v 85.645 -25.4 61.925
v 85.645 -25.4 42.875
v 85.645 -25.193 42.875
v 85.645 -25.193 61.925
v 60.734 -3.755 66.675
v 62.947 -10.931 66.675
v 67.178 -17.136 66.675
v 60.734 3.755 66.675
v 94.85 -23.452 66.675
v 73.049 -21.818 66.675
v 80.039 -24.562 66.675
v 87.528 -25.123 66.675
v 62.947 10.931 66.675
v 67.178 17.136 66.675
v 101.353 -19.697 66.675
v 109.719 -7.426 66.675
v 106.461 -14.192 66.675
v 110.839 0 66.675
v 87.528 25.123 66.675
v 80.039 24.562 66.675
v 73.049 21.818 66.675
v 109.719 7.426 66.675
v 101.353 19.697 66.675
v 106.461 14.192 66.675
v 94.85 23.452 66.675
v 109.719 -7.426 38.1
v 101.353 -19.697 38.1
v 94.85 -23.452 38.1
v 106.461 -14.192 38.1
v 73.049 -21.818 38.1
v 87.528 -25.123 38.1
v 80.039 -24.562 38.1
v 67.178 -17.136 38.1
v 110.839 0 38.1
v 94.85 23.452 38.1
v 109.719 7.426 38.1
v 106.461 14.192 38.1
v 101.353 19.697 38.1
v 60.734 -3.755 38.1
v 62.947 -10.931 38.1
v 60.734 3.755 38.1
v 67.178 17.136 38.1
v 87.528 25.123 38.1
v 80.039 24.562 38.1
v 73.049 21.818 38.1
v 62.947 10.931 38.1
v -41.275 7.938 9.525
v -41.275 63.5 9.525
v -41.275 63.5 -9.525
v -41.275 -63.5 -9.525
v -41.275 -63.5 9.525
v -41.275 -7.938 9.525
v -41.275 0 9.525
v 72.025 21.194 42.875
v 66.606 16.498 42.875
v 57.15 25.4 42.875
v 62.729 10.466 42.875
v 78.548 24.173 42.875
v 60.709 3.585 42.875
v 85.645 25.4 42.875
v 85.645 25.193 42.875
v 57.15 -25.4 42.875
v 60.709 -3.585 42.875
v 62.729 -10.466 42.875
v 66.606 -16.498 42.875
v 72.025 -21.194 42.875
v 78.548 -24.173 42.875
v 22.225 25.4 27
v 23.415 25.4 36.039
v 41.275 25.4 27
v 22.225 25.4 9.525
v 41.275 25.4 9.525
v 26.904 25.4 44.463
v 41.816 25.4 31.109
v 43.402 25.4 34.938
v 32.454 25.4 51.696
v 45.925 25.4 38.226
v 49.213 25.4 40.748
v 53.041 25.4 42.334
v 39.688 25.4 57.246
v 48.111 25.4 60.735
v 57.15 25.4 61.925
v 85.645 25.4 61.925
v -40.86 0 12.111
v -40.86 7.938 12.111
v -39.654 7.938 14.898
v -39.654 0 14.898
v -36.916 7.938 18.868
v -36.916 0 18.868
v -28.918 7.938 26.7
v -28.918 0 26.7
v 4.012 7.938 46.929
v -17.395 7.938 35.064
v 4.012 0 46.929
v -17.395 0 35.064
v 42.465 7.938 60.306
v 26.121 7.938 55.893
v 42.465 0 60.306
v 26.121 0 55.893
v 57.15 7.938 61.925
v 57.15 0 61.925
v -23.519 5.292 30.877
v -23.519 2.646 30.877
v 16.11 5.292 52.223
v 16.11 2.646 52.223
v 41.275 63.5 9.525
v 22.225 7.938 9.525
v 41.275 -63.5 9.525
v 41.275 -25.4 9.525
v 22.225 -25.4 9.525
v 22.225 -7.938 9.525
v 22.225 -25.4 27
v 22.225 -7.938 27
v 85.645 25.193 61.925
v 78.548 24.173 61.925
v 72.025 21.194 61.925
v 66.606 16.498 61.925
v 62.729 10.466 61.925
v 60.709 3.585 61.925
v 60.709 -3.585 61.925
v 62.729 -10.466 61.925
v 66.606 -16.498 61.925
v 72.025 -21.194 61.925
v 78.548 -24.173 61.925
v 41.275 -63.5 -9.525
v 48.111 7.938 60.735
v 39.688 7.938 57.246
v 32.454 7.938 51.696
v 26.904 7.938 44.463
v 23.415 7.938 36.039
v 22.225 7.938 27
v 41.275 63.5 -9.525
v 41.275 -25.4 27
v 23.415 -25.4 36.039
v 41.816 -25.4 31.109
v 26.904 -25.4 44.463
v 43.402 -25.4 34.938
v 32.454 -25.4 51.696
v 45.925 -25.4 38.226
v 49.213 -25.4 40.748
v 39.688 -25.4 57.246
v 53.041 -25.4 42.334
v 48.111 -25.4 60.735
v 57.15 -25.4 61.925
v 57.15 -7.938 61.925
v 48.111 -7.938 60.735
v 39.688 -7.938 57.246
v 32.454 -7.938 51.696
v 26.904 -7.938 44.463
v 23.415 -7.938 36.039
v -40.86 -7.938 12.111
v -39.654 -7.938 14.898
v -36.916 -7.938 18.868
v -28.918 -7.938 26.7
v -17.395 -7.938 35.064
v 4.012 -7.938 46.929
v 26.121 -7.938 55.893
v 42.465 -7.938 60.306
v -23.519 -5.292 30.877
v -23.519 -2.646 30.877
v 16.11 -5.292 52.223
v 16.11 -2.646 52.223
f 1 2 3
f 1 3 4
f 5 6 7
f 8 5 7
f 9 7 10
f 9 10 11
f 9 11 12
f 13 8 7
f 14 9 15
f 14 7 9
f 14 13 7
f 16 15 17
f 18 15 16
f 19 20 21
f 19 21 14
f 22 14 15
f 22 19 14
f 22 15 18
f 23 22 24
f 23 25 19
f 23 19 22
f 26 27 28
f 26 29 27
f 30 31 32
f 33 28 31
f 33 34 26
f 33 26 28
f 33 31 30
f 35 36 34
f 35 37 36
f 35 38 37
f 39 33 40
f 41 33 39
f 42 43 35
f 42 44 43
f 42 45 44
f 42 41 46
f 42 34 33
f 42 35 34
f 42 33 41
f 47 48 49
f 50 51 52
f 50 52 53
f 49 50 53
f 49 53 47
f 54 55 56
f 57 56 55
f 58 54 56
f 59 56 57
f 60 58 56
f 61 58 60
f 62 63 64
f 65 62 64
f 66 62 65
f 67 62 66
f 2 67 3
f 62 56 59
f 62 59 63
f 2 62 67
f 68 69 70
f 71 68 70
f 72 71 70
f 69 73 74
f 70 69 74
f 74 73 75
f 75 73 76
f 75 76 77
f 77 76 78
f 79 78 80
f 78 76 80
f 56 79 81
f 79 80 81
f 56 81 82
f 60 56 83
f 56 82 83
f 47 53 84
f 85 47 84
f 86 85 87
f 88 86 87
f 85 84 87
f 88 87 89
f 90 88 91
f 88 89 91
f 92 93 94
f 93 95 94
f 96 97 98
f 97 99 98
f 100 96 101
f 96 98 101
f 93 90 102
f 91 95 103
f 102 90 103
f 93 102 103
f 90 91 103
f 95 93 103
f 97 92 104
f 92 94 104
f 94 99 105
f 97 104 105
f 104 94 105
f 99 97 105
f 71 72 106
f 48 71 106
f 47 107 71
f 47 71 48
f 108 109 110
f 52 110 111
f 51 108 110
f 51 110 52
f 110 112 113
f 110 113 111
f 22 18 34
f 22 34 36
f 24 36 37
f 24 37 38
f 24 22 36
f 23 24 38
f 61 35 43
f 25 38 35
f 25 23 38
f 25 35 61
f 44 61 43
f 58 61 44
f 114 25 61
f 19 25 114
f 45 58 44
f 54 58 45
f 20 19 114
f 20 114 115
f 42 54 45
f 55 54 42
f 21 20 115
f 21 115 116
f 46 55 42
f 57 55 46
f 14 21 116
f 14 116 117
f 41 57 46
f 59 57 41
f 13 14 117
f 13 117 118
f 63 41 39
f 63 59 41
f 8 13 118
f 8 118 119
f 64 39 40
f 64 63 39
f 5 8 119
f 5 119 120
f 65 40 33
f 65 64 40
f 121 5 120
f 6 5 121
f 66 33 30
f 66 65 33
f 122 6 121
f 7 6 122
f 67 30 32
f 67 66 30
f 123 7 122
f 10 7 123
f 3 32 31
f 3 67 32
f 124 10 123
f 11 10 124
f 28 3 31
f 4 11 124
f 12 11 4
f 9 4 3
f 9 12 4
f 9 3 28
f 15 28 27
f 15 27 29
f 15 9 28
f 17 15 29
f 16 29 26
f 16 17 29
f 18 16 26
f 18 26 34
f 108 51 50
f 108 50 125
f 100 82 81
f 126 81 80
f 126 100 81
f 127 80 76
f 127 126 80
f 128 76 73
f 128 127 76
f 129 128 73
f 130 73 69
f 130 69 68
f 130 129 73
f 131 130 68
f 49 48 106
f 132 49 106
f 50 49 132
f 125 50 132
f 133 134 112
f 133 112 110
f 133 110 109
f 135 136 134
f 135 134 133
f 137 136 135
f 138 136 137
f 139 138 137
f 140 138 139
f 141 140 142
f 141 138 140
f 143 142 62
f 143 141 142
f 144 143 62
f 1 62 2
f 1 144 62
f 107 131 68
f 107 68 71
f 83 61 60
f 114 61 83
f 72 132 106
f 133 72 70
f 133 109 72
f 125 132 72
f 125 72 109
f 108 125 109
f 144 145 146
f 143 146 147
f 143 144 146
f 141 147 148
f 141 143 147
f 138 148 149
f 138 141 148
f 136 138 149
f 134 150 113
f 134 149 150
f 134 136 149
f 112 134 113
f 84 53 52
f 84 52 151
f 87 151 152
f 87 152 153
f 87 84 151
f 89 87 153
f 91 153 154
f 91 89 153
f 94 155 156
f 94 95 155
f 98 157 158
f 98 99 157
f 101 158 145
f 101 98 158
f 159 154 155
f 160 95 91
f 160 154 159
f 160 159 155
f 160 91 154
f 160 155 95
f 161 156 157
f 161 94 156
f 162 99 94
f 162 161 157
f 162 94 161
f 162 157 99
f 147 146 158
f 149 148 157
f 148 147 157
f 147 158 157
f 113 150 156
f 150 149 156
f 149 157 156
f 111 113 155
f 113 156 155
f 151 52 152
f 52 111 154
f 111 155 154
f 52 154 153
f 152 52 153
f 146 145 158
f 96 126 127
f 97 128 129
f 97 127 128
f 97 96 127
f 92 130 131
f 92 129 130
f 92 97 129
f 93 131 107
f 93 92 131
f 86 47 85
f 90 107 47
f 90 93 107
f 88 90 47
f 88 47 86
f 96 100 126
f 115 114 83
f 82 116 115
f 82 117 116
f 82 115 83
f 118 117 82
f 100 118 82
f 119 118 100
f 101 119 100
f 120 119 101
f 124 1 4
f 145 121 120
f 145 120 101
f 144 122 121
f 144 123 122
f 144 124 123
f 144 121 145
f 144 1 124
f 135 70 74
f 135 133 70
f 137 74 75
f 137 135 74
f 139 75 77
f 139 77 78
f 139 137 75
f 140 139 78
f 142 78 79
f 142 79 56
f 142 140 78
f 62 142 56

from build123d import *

# Parameters (mm, degrees)
F1_DEPTH = 63.5
F0_W     = 25.6068090757
F0_H     = 19.05
F2_DEPTH = 25.4
F3_DEPTH = 7.9375


with BuildPart() as f1:
    # F0 (on Front) → F1 (new body, symmetric)
    with BuildSketch(Plane.XZ):
        Polygon((-41.275, 9.525), (-41.275, -9.525), (41.275, -9.525), (41.275, 9.525), (22.225, 9.525), align=None)
    extrude(amount=F1_DEPTH, both=True)

    # F0 (on Front) → F2 (join, symmetric)
    with BuildSketch(Plane.XZ):
        with Locations((72.8420397361, 52.4002)):
            Rectangle(F0_W, F0_H)
        with BuildLine():
            Line((22.225, 9.525), (41.275, 9.525))
            Line((41.275, 9.525), (41.275, 27.0002))
            ThreePointArc((41.275, 27.0002), (45.9246798487, 38.2255201513), (57.15, 42.8752))
            Line((57.15, 42.8752), (60.0386351983, 42.8752))
            Line((60.0386351983, 42.8752), (60.0386351983, 61.9252))
            Line((60.0386351983, 61.9252), (57.15, 61.9252))
            ThreePointArc((57.15, 61.9252), (32.4542956671, 51.6959043329), (22.225, 27.0002))
            Line((22.225, 27.0002), (22.225, 9.525))
        make_face()
    extrude(amount=F2_DEPTH, both=True)

    # F0 (on Front) → F3 (join, symmetric)
    with BuildSketch(Plane.XZ):
        with BuildLine():
            add(Edge.make_bspline(
                [(-41.275, 9.525), (-41.275, 27.0002), (22.225, 61.9252), (57.15, 61.9252)],
                knots=[0, 0, 0, 0, 111.5045361635, 111.5045361635, 111.5045361635, 111.5045361635], degree=3))
            Line((-41.275, 9.525), (22.225, 9.525))
            Line((22.225, 9.525), (22.225, 27.0002))
            ThreePointArc((22.225, 27.0002), (32.4542956671, 51.6959043329), (57.15, 61.9252))
        make_face()
    extrude(amount=F3_DEPTH, both=True)

    # F0 (on Front) → F4 (revolve)
    with BuildSketch(Plane.XZ):
        Polygon((85.6454442739, 66.675), (85.6454442739, 61.9252), (85.6454442739, 42.8752), (85.6454442739, 38.1), (110.8386351983, 38.1), (110.8386351983, 66.675), align=None)
    revolve(axis=Axis((85.6454442739, 0, 52.3875), (0, 0, 1)))


solid = f1.part
